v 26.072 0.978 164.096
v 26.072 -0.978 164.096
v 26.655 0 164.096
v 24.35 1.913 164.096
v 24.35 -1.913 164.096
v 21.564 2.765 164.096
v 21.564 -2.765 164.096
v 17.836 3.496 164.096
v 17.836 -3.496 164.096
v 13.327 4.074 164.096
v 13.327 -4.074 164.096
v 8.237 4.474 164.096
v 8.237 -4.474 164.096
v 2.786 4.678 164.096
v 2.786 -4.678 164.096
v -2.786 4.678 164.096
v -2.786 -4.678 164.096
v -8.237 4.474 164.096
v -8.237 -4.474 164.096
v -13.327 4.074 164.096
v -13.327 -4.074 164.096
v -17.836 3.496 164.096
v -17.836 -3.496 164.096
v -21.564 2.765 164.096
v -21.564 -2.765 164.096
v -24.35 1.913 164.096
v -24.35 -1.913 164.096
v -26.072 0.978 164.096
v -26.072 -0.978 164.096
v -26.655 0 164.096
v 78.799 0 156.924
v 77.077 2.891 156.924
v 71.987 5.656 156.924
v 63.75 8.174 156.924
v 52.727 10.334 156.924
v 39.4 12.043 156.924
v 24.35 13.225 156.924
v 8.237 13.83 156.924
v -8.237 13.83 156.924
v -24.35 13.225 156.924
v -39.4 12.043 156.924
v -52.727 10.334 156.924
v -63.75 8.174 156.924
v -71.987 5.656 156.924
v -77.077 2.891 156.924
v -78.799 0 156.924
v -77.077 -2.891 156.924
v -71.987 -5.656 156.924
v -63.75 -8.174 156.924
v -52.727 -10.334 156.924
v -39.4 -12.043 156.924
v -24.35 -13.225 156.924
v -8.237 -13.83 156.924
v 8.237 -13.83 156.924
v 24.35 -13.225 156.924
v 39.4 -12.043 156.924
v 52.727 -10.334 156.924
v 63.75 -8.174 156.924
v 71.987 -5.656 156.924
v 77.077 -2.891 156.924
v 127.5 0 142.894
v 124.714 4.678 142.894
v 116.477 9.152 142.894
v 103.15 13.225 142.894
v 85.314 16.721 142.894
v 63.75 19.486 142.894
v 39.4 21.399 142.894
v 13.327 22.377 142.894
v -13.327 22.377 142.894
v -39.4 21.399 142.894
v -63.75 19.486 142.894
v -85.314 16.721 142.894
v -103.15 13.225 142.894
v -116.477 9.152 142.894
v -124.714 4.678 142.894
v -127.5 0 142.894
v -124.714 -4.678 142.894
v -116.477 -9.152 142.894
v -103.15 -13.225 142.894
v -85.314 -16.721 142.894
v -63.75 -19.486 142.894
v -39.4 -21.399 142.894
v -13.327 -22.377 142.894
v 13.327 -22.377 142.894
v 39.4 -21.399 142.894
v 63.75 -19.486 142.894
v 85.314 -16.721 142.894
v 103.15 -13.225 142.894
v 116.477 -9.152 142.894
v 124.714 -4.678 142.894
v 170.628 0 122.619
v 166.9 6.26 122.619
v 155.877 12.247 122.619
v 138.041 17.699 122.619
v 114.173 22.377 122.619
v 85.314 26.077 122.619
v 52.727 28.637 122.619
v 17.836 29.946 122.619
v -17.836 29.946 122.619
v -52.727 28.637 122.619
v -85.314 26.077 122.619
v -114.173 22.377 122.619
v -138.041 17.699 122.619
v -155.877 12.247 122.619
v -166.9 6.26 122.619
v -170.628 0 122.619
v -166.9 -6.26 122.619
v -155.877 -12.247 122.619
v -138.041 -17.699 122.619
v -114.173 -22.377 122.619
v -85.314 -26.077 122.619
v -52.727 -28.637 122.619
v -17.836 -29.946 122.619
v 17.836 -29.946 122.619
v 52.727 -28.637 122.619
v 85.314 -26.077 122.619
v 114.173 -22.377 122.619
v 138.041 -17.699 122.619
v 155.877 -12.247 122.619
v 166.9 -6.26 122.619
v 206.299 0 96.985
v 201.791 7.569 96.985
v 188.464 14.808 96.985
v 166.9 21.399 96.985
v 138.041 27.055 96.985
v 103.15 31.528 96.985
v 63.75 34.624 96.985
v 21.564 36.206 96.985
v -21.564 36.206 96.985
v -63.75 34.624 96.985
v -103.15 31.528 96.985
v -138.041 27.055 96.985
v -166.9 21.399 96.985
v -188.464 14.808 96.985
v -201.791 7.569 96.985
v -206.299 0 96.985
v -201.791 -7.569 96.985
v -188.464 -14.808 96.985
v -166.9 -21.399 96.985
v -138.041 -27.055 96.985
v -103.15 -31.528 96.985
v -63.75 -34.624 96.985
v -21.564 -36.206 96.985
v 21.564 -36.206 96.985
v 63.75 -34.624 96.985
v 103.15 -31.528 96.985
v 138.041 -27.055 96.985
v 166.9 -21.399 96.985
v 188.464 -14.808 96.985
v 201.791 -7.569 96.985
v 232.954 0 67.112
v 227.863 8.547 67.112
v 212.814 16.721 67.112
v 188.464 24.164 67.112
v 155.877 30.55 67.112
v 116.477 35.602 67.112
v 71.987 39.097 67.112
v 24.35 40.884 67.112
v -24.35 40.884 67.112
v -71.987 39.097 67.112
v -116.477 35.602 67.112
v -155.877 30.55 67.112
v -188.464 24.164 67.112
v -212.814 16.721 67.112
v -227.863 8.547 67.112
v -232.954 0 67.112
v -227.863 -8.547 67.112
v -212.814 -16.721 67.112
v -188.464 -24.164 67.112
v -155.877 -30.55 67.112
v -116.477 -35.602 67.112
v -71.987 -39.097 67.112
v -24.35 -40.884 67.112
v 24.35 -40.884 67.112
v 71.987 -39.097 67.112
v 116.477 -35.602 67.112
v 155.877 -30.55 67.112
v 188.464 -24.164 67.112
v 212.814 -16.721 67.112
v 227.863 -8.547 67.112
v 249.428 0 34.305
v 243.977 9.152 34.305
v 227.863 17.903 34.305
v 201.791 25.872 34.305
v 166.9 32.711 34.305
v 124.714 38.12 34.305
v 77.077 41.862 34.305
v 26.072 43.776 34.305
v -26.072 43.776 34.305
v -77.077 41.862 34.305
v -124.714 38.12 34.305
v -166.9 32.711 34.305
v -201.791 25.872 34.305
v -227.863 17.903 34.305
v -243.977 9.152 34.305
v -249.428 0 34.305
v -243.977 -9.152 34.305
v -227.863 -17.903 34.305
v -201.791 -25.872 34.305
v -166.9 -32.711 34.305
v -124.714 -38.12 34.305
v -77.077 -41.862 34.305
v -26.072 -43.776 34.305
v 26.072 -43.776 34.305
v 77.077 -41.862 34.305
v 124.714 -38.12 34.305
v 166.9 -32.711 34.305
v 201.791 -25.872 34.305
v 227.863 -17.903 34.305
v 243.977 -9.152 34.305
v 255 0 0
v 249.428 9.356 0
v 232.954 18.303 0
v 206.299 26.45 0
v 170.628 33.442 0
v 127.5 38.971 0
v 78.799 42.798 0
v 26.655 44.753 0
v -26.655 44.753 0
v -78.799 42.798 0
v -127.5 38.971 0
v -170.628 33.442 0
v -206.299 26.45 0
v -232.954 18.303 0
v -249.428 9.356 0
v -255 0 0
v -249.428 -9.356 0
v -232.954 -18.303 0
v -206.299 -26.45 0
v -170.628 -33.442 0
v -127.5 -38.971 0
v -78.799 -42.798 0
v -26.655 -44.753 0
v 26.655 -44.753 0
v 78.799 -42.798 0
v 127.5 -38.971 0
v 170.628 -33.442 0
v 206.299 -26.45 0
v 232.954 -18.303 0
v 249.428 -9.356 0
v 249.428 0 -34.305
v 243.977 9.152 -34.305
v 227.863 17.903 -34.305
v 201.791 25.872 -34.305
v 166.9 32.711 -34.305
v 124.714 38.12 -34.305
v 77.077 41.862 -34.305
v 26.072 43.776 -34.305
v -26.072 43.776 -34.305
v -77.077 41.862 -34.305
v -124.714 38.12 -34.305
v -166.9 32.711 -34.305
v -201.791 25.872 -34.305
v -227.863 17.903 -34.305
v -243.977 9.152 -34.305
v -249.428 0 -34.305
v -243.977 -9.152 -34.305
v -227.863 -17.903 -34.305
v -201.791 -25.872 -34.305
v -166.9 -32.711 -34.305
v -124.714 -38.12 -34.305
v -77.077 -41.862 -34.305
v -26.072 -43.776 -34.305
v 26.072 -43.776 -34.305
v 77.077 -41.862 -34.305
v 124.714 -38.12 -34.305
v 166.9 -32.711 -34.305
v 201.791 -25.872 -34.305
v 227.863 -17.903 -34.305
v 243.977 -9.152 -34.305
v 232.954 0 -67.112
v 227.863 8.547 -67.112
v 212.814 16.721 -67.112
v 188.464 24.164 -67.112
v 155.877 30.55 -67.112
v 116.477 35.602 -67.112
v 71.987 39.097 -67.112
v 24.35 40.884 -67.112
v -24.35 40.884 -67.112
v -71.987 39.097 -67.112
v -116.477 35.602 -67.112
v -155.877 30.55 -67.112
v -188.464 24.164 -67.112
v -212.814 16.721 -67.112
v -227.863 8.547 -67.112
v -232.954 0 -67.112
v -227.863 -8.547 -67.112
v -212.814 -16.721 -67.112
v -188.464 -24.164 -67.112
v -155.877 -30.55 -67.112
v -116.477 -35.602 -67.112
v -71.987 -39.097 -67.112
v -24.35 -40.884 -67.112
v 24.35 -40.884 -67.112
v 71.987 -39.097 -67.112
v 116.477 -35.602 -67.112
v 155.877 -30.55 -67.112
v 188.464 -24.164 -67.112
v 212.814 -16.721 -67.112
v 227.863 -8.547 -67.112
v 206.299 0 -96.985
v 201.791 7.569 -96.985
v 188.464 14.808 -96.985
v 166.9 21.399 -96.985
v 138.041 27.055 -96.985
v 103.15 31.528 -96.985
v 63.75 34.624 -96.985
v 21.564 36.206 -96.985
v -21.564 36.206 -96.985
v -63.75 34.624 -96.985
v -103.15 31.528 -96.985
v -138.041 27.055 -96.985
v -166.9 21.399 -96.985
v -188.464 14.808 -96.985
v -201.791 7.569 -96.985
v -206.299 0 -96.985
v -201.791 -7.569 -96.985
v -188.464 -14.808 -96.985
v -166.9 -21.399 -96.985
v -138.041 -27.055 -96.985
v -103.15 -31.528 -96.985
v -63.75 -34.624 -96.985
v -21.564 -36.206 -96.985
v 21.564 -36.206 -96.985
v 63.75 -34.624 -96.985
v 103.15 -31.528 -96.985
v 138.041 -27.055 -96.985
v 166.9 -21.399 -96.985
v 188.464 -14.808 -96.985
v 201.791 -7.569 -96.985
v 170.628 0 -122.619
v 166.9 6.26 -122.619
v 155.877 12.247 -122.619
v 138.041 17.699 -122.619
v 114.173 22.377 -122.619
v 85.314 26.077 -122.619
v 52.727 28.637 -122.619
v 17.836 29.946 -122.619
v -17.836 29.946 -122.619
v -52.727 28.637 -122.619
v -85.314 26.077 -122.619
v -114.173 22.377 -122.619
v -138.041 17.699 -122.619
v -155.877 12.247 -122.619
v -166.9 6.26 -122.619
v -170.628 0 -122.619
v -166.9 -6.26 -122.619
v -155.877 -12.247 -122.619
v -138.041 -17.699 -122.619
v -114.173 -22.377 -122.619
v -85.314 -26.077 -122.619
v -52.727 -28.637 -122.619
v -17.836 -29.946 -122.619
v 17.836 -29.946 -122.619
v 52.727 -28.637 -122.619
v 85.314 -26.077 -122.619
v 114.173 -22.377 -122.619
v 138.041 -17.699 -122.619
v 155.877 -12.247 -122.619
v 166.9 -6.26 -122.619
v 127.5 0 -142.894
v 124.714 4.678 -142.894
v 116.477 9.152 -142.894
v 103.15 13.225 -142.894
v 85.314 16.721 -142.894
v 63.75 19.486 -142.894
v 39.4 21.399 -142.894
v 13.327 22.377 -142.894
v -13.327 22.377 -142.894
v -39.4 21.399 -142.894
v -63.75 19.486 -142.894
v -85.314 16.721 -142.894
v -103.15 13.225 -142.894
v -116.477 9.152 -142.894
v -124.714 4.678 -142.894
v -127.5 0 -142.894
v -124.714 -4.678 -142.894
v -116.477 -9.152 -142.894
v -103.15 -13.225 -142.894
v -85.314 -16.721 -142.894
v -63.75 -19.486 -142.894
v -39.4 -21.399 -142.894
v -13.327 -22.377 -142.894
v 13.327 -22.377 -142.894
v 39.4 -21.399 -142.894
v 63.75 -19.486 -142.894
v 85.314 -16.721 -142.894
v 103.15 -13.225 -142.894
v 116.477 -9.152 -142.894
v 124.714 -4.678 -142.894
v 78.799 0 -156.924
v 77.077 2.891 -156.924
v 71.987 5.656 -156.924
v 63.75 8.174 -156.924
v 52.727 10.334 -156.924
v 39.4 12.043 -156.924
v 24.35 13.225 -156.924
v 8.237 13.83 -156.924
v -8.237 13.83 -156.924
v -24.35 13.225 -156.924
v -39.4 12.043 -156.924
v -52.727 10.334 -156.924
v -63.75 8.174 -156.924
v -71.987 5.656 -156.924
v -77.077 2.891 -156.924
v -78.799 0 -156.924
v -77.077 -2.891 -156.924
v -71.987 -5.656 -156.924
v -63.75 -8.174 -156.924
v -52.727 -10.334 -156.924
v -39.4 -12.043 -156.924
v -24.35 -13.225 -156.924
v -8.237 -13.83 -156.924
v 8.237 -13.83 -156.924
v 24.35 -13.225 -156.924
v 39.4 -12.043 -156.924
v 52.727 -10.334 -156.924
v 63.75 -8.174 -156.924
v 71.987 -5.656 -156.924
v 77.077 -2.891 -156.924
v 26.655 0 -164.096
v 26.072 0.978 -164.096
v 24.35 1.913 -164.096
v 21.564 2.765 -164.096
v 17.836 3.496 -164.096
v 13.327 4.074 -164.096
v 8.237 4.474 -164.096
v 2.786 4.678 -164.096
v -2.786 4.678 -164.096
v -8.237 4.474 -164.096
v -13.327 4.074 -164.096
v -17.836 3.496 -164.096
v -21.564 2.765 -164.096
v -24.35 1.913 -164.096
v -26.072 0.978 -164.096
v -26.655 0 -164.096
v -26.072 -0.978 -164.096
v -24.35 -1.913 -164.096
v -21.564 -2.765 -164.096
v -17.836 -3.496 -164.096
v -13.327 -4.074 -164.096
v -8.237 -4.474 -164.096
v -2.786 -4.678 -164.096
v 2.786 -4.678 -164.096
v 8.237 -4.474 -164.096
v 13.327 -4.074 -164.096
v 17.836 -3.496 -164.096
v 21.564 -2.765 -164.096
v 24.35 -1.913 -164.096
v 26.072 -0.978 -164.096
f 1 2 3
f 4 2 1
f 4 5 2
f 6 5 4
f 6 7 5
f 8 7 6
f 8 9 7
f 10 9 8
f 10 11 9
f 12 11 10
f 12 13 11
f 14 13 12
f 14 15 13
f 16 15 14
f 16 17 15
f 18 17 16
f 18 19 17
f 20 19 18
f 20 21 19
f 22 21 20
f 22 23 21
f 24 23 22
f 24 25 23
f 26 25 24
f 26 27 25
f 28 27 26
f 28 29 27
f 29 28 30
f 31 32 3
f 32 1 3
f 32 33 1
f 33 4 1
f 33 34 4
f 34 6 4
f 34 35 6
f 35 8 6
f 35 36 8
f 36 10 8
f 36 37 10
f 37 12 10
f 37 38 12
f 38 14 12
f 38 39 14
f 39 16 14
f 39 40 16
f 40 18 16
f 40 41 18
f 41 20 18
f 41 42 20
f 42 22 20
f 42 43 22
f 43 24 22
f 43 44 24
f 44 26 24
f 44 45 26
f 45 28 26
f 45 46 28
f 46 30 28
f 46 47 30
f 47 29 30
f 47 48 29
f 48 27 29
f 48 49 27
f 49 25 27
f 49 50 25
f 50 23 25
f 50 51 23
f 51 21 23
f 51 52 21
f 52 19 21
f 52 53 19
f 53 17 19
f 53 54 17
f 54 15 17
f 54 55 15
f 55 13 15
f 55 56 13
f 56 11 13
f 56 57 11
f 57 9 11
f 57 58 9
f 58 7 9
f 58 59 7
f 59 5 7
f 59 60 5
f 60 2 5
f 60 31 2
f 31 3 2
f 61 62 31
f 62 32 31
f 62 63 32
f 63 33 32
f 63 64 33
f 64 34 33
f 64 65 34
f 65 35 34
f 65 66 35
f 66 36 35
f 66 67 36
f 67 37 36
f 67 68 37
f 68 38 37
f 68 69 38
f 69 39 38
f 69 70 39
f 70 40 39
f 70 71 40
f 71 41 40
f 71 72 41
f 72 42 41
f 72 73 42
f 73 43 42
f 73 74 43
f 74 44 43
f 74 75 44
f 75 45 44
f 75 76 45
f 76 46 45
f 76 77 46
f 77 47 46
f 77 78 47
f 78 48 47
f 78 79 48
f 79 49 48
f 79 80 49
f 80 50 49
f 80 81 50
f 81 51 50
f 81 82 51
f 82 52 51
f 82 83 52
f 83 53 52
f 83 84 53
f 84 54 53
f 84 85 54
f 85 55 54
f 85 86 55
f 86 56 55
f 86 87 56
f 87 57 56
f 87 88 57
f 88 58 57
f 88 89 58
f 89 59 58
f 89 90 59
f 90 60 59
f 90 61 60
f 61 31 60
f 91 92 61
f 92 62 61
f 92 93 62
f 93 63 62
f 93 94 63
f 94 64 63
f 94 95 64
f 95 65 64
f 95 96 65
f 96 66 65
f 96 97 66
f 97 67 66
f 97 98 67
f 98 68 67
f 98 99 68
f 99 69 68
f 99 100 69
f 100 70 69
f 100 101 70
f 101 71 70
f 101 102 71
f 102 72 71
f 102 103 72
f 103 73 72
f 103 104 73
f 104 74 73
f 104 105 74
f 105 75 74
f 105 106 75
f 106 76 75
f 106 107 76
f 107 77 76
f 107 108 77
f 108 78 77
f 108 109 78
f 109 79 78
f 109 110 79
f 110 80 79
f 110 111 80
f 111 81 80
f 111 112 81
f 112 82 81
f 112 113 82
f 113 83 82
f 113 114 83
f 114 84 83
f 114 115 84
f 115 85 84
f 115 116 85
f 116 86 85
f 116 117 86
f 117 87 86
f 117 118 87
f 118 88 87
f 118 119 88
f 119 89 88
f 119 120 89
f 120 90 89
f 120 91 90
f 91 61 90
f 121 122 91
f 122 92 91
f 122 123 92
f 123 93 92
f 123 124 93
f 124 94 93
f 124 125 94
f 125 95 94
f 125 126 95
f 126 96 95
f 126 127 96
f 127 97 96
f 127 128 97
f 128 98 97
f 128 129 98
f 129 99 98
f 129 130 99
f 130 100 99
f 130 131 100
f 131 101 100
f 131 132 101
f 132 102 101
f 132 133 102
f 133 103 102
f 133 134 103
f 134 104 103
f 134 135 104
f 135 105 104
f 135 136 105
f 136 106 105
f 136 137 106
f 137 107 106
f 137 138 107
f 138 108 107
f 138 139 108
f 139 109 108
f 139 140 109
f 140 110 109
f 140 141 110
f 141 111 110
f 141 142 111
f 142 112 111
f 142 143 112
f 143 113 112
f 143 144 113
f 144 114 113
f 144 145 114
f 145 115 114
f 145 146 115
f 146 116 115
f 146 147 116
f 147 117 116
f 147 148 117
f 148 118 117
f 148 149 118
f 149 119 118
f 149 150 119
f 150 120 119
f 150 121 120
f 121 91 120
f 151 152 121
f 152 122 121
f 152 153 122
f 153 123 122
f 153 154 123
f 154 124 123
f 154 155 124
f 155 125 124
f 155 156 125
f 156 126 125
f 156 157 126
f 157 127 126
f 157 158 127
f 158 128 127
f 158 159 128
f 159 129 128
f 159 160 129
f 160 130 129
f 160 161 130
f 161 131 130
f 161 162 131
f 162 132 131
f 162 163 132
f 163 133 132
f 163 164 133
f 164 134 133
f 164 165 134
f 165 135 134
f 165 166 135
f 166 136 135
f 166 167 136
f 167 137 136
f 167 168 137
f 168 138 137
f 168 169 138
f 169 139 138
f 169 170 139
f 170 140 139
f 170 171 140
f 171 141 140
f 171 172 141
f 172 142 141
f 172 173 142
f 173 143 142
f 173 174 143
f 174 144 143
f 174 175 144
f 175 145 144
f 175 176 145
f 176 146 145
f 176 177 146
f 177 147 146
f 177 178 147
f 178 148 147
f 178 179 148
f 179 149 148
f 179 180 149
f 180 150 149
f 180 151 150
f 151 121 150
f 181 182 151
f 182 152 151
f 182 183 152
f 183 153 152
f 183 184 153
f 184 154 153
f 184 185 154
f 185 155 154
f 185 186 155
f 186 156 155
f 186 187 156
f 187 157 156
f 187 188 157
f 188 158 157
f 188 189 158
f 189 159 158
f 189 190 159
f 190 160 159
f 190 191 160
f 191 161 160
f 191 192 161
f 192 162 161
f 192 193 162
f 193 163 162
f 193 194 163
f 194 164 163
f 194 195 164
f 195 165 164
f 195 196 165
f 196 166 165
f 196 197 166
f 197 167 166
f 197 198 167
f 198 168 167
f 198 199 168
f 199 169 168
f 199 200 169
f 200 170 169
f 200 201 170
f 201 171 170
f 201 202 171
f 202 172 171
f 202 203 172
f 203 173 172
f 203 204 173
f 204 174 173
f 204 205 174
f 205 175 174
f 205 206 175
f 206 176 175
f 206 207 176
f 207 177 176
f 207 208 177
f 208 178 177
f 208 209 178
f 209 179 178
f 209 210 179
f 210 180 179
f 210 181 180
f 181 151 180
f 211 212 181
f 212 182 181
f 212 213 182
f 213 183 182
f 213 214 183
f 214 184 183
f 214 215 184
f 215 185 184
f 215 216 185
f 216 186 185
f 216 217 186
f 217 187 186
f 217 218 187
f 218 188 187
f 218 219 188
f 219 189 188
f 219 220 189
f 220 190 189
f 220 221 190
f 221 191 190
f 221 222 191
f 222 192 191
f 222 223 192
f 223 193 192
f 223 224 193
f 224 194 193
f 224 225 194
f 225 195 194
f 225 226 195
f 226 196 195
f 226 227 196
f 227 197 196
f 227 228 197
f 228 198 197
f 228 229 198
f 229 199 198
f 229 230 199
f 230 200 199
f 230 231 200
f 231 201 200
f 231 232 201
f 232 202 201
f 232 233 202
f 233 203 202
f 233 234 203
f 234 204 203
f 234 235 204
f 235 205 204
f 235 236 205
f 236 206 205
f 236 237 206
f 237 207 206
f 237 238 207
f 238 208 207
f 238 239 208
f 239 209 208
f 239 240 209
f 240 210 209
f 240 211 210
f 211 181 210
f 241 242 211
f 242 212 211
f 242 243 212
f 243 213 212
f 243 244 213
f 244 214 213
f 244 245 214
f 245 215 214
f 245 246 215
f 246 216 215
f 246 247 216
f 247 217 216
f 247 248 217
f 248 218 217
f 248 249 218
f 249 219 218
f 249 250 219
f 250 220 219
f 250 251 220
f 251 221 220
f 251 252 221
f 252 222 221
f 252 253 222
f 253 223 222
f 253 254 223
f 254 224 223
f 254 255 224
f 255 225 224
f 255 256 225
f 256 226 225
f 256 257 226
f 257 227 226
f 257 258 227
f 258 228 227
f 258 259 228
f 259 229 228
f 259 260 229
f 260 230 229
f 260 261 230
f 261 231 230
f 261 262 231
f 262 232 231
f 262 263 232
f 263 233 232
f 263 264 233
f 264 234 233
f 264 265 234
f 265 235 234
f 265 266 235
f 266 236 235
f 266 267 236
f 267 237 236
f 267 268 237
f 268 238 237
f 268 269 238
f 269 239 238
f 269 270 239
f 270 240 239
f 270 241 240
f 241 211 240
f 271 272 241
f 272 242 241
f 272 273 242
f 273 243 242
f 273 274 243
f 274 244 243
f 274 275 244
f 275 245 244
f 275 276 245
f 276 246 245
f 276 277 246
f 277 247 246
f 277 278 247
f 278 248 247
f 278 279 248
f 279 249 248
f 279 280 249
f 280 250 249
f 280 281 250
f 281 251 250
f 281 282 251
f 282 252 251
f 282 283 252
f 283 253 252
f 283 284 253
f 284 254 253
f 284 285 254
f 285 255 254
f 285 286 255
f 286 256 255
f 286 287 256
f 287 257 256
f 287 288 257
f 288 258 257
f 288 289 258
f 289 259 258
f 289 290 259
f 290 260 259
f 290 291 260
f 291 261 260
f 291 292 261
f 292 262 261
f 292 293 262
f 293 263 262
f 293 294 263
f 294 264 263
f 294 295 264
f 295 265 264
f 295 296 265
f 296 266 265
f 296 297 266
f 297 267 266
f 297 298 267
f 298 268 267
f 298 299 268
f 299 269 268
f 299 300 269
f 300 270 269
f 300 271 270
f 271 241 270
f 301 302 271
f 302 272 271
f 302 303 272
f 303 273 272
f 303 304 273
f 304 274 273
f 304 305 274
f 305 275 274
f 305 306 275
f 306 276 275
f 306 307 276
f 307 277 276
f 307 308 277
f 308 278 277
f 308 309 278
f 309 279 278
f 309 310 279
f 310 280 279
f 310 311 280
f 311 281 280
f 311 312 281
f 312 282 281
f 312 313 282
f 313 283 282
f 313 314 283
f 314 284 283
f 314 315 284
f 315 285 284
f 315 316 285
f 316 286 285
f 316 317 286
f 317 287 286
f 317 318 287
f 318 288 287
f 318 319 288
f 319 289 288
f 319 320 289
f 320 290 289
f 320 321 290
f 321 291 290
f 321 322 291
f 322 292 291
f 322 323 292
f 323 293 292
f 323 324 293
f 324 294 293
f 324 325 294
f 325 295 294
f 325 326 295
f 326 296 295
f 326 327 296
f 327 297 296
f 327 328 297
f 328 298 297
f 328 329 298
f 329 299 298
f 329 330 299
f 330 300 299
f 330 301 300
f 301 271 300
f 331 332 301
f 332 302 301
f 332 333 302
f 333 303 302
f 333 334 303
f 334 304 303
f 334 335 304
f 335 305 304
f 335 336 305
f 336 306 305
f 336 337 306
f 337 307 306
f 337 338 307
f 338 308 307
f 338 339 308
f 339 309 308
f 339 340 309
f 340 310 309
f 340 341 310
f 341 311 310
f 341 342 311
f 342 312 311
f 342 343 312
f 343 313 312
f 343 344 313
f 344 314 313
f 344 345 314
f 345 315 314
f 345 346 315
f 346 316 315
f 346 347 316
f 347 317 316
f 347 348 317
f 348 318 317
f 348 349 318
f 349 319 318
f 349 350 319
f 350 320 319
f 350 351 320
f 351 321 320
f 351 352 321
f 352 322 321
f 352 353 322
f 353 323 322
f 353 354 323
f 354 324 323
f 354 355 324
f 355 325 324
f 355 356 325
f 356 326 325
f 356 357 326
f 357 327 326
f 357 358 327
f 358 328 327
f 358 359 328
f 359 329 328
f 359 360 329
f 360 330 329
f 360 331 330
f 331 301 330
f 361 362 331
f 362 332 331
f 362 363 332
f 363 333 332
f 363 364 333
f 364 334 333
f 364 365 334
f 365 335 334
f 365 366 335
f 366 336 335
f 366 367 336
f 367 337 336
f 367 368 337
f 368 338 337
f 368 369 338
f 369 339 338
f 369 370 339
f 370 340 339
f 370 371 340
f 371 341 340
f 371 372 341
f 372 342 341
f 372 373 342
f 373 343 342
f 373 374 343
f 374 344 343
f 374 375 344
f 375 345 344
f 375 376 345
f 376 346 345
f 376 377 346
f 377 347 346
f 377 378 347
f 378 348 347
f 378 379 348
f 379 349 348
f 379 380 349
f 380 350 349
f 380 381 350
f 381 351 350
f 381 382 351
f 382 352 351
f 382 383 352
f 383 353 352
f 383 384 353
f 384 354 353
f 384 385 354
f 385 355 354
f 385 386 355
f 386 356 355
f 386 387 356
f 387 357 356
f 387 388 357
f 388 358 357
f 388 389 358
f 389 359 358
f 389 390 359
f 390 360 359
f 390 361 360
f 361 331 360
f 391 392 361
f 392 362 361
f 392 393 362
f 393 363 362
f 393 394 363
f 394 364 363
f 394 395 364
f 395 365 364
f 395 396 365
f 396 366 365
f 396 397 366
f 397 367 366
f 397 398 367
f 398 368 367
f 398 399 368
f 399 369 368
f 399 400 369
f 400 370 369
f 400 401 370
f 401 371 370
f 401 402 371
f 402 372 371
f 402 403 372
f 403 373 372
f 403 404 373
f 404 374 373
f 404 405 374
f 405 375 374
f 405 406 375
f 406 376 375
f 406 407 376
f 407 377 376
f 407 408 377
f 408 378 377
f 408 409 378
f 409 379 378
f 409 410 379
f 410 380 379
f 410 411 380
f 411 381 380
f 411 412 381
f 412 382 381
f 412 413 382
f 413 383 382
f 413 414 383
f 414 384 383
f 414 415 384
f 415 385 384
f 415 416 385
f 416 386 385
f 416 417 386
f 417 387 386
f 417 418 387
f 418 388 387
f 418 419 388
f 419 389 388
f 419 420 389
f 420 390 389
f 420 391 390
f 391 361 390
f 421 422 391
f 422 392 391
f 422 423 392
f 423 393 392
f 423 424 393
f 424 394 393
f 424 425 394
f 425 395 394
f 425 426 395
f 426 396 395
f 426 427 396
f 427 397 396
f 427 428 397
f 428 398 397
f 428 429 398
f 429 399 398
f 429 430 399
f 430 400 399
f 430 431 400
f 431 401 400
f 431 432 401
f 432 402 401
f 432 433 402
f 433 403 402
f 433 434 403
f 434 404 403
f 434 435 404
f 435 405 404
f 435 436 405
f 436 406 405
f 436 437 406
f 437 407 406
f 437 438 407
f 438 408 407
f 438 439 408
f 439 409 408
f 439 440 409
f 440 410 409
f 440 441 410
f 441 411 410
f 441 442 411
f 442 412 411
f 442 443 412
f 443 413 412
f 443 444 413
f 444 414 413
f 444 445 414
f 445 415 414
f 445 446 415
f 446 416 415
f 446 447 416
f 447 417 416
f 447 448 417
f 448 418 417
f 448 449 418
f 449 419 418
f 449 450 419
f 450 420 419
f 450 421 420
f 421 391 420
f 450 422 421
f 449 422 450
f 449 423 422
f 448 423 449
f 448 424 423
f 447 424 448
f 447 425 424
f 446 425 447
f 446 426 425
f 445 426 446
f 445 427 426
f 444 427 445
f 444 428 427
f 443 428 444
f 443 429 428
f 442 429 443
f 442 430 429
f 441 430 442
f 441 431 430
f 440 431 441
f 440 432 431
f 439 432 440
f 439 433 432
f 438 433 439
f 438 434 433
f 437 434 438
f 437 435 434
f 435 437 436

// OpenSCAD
// Generated by SolidPython 1.0.1 on 2020-07-29 00:46:52


scale(v = [17, 3, 11]) {
	sphere(r = 15);
}
/***********************************************
*********      SolidPython code:      **********
************************************************
 
# import packages: SolidPython
from solid import *
from solid.utils import *
from itertools import chain, combinations, permutations


class Resize:

    def __init__(self, scad_file):
        self.scad_file = scad_file
        #self.scad_file = import_scad(scad_file)
        # cone/cylinder param:
        self.r1 = 0
        self.r2 = 0
        self.h = 0
        # rectangular prism param:
        self.w = 0
        self.l = 0
        # ellipse param:
        self.r = 0

    # import OpenScad code (file name corresponds to shape)


    # classify shape + parameters
    def assign(self, param1, param2, param3):
        if self.scad_file == 'cone.scad':
            self.r1 = param1
            self.r2 = param2
            self.h = param3
        elif self.scad_file == 'cylinder.scad':
            self.r1 = param1
            self.r2 = param2
            self.h = param3
        elif self.scad_file == 'rectangularPrism.scad':
            self.h = param1
            self.l = param2
            self.w = param3
        else:
            self.r = param1
            self.h = param2

    # resize parameters
    def iterate(self):
        x = range(3, 20, 2)
        i = 1
        if self.scad_file == 'cone.scad':
            tempList = list(permutations(x, 2))
            for temp in tempList:
                param1 = temp[0]
                param2 = temp[1]
                filepath = 'produced_scad_files/' + 'cone' + str(param1) + '_' + str(param2) + '_' + '.scad'
                scad_render_to_file(cylinder(h=param1, r1=param2, r2=0), filepath)

        elif self.scad_file == 'cylinder.scad':
            tempList = list(permutations(x, 3))
            for temp in tempList:
                param1 = temp[0]
                param2 = temp[1]
                filepath = 'produced_scad_files/' + 'cylinder' + str(param1) + '_' + str(param2) + '_' + '.scad'
                scad_render_to_file(cylinder(h=param1, r1=param2, r2=param2), filepath)

        elif self.scad_file == 'rectangularPrism.scad':
            tempList = list(permutations(x, 3))
            for temp in tempList:
                param1 = temp[0]
                param2 = temp[1]
                param3 = temp[2]
                filepath = 'produced_scad_files/' + 'rectangularPrism' + str(param1) + '_' + str(param2) + '_' + str(
                    param3) + '.scad'
                scad_render_to_file(cube(size=(param1, param2, param3)), filepath)

        elif self.scad_file == 'ellipse.scad':
            tempList = list(permutations(x, 4))
            for temp in tempList:
                param1 = temp[0]
                param2 = temp[1]
                param3 = temp[2]
                param4 = temp[3]
                filepath = 'produced_scad_files/' + 'ellipse' + str(param1) + '_' + str(param2) + '_' + str(param3) + '_' + str(param4) + '.scad'
                scad_render_to_file(scale([param1, param2, param3])(sphere(r=param4)), filepath)

    def render_to_scadfile(self):
        scad_render_to_file(scad, 'example.scad') 
 
************************************************/
